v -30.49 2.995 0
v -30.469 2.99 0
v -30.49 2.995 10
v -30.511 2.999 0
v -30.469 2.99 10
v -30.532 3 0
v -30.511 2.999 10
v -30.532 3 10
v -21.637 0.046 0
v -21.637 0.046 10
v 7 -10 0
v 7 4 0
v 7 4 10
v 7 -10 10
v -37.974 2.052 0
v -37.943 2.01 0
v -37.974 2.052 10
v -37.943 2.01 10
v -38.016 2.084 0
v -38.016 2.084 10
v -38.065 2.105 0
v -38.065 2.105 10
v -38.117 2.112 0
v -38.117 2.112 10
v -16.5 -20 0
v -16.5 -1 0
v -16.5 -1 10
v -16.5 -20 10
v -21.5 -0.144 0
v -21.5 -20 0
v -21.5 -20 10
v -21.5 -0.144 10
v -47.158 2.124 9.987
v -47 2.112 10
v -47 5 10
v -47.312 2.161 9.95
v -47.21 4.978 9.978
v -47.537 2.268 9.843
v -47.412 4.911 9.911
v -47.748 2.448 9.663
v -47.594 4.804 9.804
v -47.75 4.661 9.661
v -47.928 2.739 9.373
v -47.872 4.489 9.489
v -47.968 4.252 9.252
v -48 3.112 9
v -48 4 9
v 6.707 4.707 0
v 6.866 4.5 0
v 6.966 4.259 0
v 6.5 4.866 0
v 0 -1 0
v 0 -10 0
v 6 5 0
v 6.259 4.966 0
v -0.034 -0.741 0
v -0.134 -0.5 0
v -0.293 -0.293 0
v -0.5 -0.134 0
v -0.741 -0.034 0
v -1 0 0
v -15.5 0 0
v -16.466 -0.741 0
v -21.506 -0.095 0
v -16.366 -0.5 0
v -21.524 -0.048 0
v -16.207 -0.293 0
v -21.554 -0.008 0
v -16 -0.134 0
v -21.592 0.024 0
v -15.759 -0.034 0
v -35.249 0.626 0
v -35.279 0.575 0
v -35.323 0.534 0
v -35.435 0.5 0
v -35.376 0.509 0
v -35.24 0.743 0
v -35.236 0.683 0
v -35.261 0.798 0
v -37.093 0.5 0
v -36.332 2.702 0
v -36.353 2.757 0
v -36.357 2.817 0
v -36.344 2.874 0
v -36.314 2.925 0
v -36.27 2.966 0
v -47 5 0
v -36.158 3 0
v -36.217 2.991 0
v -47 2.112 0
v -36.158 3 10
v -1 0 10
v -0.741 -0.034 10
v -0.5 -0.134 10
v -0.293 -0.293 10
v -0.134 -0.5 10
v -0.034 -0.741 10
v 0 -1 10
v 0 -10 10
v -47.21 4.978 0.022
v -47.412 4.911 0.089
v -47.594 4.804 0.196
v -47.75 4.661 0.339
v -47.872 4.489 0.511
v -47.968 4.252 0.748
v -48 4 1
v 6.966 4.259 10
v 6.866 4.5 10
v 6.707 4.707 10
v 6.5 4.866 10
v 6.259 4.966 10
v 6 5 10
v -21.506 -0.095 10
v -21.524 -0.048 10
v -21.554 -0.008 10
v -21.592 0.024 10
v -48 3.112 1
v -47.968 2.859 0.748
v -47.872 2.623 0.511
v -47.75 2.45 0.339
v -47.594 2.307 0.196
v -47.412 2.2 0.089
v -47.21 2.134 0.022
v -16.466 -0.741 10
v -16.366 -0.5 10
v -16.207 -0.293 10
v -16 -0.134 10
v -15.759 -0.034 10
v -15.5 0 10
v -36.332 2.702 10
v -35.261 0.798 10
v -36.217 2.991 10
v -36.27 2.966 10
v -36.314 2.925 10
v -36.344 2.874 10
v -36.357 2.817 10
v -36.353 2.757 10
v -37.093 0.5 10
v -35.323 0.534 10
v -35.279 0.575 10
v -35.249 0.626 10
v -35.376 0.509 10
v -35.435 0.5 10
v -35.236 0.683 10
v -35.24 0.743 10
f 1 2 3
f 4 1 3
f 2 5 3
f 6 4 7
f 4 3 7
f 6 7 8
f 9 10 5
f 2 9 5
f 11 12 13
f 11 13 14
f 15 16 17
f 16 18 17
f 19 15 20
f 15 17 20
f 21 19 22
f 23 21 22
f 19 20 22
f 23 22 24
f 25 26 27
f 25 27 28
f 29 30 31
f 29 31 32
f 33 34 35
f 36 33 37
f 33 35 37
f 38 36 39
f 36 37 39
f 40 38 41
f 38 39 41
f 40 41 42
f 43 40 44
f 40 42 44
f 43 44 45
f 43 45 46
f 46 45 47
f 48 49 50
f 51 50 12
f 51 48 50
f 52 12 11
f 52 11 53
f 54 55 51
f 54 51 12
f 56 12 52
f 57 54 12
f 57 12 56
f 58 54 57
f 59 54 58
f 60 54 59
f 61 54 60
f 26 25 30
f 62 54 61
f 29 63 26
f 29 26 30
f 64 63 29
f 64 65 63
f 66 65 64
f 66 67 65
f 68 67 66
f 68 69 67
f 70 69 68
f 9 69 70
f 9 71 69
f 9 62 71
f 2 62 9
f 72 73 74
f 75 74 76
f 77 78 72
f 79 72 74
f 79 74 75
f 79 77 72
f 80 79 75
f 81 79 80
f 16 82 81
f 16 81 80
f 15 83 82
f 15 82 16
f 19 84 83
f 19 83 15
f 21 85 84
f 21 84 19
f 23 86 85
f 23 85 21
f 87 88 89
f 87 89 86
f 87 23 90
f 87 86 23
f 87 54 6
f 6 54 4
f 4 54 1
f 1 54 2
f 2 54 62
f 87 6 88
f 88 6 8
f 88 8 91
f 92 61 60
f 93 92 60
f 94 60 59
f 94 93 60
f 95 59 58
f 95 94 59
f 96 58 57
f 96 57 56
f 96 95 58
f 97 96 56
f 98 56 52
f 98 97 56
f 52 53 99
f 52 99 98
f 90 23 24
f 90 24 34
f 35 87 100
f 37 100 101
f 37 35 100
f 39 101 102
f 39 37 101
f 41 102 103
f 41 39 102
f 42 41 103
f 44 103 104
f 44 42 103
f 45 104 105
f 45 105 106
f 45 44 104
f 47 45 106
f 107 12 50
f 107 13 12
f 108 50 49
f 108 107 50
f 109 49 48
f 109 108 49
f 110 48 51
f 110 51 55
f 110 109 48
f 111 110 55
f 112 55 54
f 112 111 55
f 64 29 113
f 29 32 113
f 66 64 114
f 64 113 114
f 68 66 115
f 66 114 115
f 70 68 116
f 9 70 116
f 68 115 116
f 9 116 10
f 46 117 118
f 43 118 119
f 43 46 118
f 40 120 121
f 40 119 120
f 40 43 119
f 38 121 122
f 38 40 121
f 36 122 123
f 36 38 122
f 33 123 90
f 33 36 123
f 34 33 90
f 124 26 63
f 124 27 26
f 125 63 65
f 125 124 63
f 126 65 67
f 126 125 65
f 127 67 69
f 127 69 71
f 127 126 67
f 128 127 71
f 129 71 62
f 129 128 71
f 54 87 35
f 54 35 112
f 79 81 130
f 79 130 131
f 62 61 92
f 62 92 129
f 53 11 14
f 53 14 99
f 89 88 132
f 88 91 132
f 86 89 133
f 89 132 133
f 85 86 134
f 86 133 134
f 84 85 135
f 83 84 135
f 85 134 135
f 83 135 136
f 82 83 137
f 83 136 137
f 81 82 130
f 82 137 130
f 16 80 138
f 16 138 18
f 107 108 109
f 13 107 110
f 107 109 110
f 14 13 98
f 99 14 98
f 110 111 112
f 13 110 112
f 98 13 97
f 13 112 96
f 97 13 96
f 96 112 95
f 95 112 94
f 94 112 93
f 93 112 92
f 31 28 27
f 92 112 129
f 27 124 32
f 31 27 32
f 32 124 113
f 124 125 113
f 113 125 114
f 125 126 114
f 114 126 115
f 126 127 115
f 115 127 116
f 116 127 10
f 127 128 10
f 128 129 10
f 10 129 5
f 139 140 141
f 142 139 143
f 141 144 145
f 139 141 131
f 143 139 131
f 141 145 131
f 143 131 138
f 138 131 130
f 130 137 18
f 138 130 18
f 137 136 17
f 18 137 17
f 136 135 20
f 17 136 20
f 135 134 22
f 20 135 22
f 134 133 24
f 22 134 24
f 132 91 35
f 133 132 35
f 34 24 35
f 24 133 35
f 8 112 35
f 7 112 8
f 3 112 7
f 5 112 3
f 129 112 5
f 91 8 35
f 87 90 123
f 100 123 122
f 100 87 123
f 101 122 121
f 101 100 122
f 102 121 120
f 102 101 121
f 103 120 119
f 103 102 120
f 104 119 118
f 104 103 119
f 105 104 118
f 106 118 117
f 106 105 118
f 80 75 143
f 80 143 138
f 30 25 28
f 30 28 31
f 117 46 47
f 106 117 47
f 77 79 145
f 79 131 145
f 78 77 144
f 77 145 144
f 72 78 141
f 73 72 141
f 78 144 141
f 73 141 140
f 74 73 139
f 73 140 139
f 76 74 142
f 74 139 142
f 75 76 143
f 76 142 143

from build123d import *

# Parameters (mm, degrees)
BOSS_EXTRUDE1_DEPTH = 10
FILLET3_R           = 0.2
FILLET4_R           = 1


with BuildPart() as part:
    # Sketch1 → Boss-Extrude1 (new body)
    with BuildSketch(Plane.XY):
        Polygon((-48, 2.11152184), (-48, 5), (7, 5), (7, -10), (0, -10), (0, 0), (-16.5, 0), (-16.5, -20), (-21.5, -20), (-21.5, 0), (-30.5, 3), (-36.5, 3), (-35.093099913, 0.5), (-37.093099913, 0.5), (-38, 2.11152184), align=None)
    extrude(amount=BOSS_EXTRUDE1_DEPTH)

    # Fillet3
    fillet3_edges = [part.edges().sort_by_distance(p)[0] for p in [
        (-36.5, 3, 5),
        (-35.093099913, 0.5, 5),
        (-38, 2.11152184, 5),
        (-21.5, 0, 5),
        (-30.5, 3, 5),
    ]]
    fillet(fillet3_edges, radius=FILLET3_R)

    # Fillet4
    fillet4_edges = [part.edges().sort_by_distance(p)[0] for p in [
        (-48, 3.55576092, 0),
        (-48, 2.11152184, 5),
        (-48, 5, 5),
        (7, 5, 5),
        (0, 0, 5),
        (-16.5, 0, 5),
        (-48, 3.55576092, 10),
    ]]
    fillet(fillet4_edges, radius=FILLET4_R)


solid = part.part
